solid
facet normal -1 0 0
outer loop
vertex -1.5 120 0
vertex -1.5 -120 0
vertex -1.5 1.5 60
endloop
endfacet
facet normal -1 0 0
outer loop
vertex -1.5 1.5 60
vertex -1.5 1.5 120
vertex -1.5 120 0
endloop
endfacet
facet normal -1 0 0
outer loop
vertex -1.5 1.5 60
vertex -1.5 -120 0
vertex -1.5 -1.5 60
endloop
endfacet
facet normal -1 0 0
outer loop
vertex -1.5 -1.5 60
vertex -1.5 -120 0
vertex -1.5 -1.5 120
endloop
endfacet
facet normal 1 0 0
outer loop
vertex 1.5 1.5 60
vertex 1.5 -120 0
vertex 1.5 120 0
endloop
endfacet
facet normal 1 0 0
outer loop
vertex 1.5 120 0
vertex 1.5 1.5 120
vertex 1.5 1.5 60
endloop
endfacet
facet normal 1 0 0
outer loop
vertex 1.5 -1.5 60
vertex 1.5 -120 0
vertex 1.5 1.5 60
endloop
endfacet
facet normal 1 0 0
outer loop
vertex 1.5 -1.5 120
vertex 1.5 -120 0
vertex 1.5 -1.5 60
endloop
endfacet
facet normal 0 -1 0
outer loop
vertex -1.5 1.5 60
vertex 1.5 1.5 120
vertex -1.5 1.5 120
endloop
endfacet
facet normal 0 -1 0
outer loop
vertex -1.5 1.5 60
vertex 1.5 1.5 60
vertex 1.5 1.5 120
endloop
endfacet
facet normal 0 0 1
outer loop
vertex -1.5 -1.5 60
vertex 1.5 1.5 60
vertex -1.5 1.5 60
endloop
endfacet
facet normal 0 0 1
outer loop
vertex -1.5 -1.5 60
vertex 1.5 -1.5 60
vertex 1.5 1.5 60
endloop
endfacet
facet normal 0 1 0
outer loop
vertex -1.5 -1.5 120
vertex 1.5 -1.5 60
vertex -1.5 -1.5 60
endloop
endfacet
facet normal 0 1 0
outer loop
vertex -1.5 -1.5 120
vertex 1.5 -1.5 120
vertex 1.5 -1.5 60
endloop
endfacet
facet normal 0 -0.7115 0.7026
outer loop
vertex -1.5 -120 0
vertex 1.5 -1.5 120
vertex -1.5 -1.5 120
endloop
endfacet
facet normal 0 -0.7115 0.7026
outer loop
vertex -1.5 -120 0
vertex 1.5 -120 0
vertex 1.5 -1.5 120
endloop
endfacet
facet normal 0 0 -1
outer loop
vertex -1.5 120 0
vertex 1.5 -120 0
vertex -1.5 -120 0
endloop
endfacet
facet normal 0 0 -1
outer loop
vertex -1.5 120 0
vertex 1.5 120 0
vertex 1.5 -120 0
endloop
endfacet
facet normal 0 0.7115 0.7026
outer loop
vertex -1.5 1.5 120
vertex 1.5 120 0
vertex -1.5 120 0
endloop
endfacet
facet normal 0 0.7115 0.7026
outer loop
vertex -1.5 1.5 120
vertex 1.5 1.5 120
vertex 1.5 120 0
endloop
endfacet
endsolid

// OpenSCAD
// file: config.scad
$fn = 50;
nothing = 0.01;

material_z = 3;

body_width = 120;
body_height = 300;

foot_x = 120;
foot_z = 120;
foot_sideshift = 50;
// main file
include <config.scad>;

module foot()
{
    rotate([90, 0, 90])
    linear_extrude(material_z, center=true)
    //difference()
    {
        polygon([
            [-foot_x, 0],
            [+foot_x, 0],
            [+material_z/2, +foot_z],
            [+material_z/2, +foot_z/2],
            [-material_z/2, +foot_z/2],
            [-material_z/2, +foot_z]
            ], center=true);
/*        
#        translate([
#            120,
#            120
#            ])
#        circle(r=120);
        */
    }
}

foot();
